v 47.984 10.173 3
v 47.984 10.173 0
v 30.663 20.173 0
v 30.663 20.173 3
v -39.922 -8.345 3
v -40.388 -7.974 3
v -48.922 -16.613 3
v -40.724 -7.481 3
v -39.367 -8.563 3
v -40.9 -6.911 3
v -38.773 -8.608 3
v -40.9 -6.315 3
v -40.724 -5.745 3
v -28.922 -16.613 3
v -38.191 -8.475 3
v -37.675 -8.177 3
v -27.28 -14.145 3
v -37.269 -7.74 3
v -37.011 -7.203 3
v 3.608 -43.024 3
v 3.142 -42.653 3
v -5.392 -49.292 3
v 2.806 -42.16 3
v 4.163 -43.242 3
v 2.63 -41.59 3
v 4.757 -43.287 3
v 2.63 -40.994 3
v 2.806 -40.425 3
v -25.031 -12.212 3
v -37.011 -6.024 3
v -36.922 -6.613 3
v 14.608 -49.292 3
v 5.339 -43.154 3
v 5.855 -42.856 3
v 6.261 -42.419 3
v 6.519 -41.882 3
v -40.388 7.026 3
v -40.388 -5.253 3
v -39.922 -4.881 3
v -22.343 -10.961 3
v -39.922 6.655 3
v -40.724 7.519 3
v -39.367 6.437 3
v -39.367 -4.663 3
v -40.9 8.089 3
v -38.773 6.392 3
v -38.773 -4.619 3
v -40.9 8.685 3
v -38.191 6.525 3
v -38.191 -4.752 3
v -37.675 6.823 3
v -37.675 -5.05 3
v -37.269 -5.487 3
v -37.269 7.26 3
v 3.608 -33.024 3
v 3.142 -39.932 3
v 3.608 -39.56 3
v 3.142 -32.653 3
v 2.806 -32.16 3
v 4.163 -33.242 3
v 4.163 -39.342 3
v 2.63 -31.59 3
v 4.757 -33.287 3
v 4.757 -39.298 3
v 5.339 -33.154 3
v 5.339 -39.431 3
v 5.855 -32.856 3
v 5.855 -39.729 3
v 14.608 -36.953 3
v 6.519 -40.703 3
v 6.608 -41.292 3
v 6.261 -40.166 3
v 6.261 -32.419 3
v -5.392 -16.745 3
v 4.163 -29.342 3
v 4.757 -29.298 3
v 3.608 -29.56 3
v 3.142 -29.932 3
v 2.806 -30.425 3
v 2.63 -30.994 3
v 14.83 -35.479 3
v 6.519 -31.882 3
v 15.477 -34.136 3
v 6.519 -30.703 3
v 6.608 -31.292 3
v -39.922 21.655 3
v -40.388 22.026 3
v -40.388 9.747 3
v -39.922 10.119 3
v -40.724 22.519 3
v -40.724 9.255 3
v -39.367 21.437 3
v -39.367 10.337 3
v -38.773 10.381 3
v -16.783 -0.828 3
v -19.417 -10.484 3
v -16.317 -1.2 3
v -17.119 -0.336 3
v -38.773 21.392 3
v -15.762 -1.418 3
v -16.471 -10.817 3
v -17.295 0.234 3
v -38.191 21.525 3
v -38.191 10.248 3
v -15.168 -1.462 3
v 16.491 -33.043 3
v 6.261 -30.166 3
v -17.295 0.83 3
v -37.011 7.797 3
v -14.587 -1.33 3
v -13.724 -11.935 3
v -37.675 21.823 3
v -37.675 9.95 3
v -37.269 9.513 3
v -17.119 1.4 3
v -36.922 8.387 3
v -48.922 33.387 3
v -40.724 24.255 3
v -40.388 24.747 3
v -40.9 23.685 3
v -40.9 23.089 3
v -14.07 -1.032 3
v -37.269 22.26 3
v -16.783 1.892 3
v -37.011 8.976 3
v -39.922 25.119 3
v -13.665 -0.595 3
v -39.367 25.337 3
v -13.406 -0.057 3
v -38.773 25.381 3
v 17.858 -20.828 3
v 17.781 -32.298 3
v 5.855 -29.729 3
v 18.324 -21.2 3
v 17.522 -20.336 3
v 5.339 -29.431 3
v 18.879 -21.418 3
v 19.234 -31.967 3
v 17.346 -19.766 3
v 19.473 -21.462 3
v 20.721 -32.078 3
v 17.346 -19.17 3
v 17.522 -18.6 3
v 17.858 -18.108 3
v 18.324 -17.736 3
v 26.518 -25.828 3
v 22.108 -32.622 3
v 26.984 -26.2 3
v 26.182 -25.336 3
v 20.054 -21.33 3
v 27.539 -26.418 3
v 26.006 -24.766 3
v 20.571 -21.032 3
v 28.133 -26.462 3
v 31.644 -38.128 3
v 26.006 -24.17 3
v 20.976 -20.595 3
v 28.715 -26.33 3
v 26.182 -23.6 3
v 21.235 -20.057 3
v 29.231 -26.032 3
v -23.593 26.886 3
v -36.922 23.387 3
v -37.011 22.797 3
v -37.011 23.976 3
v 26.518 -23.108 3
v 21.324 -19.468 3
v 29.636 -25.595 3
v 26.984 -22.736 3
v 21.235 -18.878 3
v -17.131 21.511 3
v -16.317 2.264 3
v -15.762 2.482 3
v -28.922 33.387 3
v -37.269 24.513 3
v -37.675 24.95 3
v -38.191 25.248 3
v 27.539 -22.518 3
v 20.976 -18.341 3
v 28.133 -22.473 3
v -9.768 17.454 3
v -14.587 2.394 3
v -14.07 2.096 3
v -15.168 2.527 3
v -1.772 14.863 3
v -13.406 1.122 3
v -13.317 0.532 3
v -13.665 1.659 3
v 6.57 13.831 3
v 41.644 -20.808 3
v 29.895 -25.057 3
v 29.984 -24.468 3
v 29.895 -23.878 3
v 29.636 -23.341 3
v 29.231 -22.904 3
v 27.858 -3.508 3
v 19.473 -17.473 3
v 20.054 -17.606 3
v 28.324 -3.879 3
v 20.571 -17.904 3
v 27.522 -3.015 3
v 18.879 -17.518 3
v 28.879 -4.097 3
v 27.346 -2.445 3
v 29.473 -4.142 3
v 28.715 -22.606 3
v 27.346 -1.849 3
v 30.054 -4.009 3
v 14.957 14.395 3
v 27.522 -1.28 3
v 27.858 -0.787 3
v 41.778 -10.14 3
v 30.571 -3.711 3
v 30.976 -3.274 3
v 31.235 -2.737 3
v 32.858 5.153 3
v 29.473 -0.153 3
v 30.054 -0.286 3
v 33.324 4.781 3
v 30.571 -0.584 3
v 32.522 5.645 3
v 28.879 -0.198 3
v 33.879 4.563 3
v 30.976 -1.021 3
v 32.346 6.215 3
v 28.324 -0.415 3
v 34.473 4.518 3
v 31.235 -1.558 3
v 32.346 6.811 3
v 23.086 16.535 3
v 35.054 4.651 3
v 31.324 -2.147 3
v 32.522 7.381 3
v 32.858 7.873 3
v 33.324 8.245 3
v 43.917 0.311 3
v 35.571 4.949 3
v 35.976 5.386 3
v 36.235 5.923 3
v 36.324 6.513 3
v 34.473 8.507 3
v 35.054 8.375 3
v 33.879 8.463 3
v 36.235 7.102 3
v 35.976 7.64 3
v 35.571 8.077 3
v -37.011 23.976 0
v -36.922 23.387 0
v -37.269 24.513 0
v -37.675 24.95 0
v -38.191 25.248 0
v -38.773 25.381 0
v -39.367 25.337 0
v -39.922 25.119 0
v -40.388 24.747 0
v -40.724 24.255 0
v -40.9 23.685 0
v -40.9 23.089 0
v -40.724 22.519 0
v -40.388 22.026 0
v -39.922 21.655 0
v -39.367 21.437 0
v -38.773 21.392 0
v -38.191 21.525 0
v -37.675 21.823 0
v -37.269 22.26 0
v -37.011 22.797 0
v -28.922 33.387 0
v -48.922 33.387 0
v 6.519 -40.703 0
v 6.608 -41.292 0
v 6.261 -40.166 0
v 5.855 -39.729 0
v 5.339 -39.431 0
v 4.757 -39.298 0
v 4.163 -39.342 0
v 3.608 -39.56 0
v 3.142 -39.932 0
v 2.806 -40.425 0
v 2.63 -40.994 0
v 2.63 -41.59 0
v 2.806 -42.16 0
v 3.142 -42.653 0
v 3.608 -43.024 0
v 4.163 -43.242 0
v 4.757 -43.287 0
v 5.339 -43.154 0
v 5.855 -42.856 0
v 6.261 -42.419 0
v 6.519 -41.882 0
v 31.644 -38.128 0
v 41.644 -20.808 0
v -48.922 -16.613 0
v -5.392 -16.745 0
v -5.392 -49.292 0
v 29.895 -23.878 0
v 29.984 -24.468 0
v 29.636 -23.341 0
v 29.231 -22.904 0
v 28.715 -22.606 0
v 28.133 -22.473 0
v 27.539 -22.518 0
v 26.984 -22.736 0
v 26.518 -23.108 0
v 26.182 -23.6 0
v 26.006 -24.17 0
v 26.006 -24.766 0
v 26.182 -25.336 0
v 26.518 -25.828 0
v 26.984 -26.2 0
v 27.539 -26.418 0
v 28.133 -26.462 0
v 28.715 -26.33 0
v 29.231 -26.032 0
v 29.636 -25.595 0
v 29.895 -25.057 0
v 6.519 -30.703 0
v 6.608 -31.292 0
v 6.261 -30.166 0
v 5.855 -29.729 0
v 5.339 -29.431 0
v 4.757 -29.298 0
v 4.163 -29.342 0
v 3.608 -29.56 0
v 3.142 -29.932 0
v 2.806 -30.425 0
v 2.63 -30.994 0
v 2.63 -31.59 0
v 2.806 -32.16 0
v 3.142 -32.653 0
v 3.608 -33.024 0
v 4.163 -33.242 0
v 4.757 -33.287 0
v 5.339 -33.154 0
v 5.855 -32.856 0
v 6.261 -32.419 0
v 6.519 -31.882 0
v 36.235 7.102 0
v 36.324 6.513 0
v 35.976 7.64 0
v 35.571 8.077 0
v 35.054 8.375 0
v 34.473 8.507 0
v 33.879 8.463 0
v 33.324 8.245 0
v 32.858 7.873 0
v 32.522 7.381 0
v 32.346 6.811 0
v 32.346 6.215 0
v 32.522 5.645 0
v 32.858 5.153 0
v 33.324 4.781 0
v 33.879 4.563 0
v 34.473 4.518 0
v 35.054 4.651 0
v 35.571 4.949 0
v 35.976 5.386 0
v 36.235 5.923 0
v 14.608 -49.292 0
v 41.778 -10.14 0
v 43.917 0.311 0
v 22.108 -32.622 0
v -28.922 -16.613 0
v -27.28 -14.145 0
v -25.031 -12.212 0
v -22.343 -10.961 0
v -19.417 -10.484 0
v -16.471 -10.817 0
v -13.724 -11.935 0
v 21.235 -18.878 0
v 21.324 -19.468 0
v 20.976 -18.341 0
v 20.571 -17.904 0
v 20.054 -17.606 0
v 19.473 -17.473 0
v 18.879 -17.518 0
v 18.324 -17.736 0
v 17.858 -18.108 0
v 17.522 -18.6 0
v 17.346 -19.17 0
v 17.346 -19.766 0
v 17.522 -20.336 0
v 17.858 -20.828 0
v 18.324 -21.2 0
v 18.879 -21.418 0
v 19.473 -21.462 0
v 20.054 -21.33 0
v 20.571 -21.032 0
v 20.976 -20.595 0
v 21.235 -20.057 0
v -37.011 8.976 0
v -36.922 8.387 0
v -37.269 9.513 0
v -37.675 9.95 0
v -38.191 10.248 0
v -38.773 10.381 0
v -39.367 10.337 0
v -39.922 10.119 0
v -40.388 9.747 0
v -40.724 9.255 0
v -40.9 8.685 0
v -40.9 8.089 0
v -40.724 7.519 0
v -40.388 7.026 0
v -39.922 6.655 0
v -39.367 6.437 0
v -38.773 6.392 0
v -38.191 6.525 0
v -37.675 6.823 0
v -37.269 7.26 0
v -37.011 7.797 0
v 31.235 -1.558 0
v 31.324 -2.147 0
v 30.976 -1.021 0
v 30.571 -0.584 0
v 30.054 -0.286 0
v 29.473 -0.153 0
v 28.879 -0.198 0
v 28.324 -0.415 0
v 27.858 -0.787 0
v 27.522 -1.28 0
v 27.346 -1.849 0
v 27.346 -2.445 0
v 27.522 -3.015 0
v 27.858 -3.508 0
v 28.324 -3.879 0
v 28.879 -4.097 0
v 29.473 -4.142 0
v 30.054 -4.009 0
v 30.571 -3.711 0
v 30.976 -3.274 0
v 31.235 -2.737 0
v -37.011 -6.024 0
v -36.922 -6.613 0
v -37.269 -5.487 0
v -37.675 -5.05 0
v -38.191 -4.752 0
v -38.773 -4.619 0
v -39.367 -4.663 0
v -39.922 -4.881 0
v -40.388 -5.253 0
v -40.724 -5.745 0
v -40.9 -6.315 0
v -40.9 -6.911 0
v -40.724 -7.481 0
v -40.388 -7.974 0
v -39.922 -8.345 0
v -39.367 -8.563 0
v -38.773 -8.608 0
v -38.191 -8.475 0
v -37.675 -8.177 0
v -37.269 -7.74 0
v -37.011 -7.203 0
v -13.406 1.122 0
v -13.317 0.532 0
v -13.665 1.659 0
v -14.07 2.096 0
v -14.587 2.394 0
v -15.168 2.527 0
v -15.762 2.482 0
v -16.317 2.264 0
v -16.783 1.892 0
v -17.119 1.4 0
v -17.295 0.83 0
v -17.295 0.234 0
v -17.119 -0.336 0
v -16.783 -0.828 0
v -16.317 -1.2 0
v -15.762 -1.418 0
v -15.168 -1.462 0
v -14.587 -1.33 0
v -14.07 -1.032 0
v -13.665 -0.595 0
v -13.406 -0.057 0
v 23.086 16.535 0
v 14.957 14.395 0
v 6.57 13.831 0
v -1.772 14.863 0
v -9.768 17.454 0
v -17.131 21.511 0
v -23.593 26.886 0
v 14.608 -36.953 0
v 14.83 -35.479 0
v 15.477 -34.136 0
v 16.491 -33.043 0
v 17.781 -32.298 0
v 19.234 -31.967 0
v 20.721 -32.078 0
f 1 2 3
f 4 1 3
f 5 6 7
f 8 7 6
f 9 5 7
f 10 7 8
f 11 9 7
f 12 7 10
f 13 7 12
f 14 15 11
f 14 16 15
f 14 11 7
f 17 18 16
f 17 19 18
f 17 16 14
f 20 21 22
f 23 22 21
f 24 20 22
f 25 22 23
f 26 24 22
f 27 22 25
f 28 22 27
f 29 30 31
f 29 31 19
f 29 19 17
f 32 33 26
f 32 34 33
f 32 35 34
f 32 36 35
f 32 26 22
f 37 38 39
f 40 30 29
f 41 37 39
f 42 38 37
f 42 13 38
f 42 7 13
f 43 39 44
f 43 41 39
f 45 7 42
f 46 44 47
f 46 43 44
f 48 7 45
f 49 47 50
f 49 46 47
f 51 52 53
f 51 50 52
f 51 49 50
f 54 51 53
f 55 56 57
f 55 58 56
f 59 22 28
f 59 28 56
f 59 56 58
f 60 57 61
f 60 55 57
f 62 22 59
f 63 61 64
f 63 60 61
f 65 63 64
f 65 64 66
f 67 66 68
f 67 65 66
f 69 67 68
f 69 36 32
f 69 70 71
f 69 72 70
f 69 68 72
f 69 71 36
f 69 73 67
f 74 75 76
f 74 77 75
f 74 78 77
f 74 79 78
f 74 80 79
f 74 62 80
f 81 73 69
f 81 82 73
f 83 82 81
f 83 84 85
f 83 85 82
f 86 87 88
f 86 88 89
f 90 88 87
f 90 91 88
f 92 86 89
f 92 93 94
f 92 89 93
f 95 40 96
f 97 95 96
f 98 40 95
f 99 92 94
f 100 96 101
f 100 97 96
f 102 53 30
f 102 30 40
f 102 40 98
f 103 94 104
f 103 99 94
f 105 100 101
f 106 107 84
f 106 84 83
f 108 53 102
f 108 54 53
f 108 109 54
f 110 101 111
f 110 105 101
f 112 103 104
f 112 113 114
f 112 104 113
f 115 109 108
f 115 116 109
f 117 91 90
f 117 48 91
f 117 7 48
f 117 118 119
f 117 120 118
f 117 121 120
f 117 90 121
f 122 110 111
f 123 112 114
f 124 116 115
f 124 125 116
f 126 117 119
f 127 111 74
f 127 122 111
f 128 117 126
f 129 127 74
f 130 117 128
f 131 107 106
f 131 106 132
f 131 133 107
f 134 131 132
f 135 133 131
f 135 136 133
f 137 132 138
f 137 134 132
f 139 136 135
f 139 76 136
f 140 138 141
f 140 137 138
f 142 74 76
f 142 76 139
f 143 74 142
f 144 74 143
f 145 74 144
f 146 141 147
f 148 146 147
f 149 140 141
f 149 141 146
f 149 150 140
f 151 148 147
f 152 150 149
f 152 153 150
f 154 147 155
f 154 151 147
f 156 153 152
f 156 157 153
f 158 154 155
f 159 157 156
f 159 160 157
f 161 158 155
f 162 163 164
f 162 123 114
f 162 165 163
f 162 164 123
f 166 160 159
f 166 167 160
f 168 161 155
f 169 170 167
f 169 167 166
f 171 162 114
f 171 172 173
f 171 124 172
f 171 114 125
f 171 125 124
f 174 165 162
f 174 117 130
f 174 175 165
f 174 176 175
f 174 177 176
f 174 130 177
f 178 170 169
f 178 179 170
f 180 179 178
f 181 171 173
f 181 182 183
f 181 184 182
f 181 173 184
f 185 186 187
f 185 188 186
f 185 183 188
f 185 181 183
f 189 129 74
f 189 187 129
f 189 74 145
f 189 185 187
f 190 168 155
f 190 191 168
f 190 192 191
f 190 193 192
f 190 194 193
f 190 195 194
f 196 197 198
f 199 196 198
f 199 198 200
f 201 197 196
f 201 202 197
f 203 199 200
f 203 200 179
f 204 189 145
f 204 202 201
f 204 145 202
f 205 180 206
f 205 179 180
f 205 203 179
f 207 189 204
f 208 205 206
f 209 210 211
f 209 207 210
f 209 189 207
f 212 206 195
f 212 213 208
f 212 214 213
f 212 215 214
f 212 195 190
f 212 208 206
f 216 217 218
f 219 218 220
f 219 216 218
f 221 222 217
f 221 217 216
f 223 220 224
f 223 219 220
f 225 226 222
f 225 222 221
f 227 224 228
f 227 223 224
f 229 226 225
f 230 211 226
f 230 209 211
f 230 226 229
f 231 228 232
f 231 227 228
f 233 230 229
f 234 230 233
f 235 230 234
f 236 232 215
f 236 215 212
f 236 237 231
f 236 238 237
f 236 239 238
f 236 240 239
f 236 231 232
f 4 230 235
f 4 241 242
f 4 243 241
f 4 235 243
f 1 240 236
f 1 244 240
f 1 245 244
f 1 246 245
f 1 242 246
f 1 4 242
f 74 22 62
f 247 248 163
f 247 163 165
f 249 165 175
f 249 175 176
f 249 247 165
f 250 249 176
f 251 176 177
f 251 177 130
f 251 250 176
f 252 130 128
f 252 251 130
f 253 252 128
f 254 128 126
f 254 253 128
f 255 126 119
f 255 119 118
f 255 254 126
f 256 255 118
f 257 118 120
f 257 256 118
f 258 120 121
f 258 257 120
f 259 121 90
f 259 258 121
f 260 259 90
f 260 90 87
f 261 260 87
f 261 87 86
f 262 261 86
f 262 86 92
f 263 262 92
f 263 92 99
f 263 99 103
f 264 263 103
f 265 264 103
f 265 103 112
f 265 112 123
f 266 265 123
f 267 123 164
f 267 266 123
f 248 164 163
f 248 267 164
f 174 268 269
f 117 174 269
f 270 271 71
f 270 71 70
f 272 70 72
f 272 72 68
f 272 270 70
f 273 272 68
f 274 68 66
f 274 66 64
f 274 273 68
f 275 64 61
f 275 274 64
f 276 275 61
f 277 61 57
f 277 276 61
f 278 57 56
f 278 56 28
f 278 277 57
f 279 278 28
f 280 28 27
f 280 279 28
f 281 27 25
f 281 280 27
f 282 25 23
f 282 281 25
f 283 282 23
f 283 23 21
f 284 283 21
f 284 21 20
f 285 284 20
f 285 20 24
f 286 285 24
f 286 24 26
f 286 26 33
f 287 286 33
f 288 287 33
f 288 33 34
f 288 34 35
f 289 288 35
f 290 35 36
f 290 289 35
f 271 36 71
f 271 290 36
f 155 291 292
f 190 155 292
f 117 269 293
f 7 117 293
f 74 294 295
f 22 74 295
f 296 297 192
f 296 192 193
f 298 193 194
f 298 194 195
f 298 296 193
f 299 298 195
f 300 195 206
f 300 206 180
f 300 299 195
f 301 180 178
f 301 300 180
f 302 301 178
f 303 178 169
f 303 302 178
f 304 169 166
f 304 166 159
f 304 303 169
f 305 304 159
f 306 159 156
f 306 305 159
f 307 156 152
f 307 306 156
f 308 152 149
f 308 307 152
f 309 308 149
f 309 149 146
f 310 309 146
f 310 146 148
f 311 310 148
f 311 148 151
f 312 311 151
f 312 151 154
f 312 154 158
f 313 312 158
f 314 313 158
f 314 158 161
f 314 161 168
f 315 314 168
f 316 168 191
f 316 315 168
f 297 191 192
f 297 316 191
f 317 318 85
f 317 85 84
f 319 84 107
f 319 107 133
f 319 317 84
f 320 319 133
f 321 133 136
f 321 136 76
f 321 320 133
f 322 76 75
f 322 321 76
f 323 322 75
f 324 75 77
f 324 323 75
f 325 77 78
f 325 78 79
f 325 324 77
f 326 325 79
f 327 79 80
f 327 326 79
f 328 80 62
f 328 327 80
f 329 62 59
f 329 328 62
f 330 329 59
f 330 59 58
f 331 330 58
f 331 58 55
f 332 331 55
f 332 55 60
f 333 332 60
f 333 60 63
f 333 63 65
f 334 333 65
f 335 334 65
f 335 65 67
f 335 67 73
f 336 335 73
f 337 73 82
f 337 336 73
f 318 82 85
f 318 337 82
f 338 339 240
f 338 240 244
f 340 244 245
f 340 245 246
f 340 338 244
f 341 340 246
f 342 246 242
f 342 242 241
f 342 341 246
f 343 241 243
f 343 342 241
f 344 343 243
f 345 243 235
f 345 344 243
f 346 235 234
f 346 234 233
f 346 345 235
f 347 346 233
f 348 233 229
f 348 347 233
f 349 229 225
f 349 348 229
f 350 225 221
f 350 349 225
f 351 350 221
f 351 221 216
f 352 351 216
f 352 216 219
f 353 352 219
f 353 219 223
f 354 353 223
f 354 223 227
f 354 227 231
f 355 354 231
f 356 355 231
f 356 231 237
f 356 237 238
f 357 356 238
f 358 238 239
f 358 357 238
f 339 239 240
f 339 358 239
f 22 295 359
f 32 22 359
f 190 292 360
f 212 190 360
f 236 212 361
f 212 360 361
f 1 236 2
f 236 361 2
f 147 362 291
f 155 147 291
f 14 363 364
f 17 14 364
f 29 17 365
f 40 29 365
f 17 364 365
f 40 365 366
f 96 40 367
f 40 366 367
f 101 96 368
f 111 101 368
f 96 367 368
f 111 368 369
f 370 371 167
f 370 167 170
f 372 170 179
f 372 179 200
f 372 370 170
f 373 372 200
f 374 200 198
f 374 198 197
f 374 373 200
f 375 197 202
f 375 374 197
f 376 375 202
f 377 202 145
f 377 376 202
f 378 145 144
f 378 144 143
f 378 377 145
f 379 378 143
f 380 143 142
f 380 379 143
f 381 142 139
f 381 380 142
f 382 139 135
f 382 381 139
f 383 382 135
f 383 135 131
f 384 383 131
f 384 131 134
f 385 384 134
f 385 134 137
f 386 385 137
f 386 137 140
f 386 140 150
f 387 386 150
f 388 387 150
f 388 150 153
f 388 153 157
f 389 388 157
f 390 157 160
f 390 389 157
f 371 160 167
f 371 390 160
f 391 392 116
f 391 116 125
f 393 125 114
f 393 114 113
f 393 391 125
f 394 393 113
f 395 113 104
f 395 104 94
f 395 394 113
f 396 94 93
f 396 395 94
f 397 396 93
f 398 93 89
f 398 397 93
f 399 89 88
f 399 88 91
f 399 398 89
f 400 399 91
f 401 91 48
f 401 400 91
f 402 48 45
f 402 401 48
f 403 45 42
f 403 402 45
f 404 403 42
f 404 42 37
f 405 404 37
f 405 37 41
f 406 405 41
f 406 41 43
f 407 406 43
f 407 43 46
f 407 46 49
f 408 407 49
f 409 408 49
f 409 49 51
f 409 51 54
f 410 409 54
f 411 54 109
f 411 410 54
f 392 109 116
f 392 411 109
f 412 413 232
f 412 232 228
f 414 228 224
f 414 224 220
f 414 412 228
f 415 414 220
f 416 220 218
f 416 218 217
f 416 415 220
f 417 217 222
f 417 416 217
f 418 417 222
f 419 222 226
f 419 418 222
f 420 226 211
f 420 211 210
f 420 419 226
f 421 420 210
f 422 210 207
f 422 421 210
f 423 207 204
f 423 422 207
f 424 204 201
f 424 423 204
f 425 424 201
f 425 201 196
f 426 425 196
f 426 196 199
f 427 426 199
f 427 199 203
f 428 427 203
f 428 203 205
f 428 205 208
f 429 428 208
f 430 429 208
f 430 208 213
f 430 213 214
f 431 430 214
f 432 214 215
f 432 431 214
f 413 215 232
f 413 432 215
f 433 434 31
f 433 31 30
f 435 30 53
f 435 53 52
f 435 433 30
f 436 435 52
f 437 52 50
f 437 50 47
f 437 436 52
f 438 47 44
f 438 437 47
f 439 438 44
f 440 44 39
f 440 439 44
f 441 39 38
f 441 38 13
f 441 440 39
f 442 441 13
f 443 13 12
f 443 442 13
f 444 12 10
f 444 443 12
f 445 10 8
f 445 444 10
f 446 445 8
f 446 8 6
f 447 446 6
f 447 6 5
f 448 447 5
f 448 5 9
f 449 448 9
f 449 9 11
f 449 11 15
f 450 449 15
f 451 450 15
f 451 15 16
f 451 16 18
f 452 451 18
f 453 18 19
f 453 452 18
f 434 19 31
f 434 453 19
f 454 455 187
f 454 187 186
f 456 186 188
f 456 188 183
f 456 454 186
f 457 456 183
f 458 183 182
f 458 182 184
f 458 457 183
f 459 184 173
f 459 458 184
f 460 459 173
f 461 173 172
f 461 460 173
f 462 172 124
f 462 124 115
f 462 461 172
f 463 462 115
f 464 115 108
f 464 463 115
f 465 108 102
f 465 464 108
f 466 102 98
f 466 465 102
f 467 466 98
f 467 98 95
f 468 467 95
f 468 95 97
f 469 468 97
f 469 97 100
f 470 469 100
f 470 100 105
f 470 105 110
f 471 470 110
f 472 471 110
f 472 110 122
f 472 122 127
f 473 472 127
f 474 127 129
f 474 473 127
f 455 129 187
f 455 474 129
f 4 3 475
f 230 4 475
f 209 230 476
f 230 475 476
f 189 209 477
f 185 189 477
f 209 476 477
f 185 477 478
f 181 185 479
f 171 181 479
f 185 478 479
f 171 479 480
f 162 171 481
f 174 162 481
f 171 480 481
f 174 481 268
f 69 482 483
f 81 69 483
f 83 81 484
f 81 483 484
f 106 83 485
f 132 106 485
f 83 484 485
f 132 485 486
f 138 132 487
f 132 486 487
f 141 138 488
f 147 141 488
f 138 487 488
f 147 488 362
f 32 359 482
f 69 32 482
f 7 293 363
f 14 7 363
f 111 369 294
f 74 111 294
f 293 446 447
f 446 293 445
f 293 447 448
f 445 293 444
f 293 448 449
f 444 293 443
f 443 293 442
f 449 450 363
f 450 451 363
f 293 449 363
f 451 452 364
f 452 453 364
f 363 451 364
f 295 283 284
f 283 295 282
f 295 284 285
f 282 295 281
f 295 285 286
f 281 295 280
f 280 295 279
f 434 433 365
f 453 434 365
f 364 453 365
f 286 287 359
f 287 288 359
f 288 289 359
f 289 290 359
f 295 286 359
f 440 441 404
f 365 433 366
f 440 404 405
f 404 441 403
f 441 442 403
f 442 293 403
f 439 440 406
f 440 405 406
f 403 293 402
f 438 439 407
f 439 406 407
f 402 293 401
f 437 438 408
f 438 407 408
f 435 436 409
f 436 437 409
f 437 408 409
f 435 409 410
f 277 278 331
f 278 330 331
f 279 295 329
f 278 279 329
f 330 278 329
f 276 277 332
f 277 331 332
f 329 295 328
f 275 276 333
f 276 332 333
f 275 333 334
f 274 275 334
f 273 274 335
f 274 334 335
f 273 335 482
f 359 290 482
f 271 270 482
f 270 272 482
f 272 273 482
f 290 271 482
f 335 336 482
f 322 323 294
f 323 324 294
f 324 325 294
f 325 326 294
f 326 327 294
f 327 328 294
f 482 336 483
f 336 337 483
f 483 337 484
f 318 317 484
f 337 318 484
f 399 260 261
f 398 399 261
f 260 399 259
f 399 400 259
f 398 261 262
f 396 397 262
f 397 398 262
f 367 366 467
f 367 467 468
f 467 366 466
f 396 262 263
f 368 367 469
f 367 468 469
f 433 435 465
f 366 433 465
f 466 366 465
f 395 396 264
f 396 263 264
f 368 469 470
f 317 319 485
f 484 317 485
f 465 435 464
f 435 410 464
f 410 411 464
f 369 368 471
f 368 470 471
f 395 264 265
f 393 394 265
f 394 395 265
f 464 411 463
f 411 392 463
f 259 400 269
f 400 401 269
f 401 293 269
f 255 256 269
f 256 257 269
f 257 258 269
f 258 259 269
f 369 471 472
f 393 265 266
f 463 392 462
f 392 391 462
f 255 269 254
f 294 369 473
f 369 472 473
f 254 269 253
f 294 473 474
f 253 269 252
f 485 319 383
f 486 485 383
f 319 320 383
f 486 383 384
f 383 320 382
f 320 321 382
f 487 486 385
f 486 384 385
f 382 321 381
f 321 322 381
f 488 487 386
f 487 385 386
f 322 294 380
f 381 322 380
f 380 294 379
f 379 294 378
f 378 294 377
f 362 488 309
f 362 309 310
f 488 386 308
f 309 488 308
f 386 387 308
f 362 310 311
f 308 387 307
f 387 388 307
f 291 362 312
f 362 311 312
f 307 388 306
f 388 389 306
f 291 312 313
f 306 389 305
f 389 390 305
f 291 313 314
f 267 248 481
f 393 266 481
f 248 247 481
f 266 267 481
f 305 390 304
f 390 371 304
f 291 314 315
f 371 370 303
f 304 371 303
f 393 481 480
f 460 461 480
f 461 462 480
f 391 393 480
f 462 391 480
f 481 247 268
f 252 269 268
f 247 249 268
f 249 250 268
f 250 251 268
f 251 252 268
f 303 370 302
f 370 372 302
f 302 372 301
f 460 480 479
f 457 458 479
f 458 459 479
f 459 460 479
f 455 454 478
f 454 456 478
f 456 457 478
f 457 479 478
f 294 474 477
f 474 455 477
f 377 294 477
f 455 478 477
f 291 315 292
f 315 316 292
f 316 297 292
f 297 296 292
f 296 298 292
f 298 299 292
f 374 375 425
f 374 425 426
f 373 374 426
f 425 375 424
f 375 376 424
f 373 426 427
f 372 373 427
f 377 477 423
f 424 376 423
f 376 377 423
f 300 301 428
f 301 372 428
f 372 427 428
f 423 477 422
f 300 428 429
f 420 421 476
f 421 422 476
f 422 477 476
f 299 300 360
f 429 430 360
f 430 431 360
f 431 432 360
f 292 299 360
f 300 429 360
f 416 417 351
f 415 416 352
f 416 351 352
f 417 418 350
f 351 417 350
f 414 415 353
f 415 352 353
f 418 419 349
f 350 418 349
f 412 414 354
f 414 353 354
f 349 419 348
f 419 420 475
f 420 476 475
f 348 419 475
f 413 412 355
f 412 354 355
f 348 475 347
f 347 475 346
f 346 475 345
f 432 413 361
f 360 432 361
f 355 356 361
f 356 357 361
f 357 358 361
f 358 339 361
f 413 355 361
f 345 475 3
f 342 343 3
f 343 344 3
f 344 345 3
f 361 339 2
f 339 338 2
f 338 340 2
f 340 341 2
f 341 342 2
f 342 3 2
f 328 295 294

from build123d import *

# Parameters (mm, degrees)
SKETCH_1_R      = 2
EXTRUDE_1_DEPTH = 3


with BuildPart() as part:
    # 草图1 → 凸台-拉伸1 (new body)
    with BuildSketch(Plane.XY):
        with BuildLine():
            Line((47.983882687, 10.173144913), (30.663374611, 20.173144913))
            ThreePointArc((30.663374611, 20.173144913), (-1.771986525, 14.862979702), (-28.921960456, 33.386732619))
            Line((-28.921960456, 33.386732619), (-48.921960456, 33.386732619))
            Line((-48.921960456, 33.386732619), (-48.921960456, -16.613267381))
            Line((-48.921960456, -16.613267381), (-28.921960456, -16.613267381))
            ThreePointArc((-28.921960456, -16.613267381), (-22.343103236, -10.961079821), (-13.724464148, -11.93455135))
            Line((-13.724464148, -11.93455135), (-5.391960456, -16.745324599))
            Line((-5.391960456, -16.745324599), (-5.391960456, -49.292329983))
            Line((-5.391960456, -49.292329983), (14.608039544, -49.292329983))
            Line((14.608039544, -49.292329983), (14.608039544, -36.952584021))
            ThreePointArc((14.608039544, -36.952584021), (17.108039544, -32.622457002), (22.108039544, -32.622457002))
            Line((22.108039544, -32.622457002), (31.644136725, -38.128125276))
            Line((31.644136725, -38.128125276), (41.644136725, -20.8076172))
            ThreePointArc((41.644136725, -20.8076172), (42.599829652, -4.864137572), (47.983882687, 10.173144913))
        make_face()
        with Locations((-38.921960456, 23.386732619)):
            Circle(SKETCH_1_R, mode=Mode.SUBTRACT)
        with Locations((-38.921960456, 8.386732619)):
            Circle(SKETCH_1_R, mode=Mode.SUBTRACT)
        with Locations((-38.921960456, -6.613267381)):
            Circle(SKETCH_1_R, mode=Mode.SUBTRACT)
        with Locations((-15.317387503, 0.532128762)):
            Circle(SKETCH_1_R, mode=Mode.SUBTRACT)
        with Locations((34.323628649, 6.512890875)):
            Circle(SKETCH_1_R, mode=Mode.SUBTRACT)
        with Locations((29.323628649, -2.147363162)):
            Circle(SKETCH_1_R, mode=Mode.SUBTRACT)
        with Locations((19.323628649, -19.467871238)):
            Circle(SKETCH_1_R, mode=Mode.SUBTRACT)
        with Locations((27.983882687, -24.467871238)):
            Circle(SKETCH_1_R, mode=Mode.SUBTRACT)
        with Locations((4.608039544, -31.292329983)):
            Circle(SKETCH_1_R, mode=Mode.SUBTRACT)
        with Locations((4.608039544, -41.292329983)):
            Circle(SKETCH_1_R, mode=Mode.SUBTRACT)
    extrude(amount=EXTRUDE_1_DEPTH)


solid = part.part
